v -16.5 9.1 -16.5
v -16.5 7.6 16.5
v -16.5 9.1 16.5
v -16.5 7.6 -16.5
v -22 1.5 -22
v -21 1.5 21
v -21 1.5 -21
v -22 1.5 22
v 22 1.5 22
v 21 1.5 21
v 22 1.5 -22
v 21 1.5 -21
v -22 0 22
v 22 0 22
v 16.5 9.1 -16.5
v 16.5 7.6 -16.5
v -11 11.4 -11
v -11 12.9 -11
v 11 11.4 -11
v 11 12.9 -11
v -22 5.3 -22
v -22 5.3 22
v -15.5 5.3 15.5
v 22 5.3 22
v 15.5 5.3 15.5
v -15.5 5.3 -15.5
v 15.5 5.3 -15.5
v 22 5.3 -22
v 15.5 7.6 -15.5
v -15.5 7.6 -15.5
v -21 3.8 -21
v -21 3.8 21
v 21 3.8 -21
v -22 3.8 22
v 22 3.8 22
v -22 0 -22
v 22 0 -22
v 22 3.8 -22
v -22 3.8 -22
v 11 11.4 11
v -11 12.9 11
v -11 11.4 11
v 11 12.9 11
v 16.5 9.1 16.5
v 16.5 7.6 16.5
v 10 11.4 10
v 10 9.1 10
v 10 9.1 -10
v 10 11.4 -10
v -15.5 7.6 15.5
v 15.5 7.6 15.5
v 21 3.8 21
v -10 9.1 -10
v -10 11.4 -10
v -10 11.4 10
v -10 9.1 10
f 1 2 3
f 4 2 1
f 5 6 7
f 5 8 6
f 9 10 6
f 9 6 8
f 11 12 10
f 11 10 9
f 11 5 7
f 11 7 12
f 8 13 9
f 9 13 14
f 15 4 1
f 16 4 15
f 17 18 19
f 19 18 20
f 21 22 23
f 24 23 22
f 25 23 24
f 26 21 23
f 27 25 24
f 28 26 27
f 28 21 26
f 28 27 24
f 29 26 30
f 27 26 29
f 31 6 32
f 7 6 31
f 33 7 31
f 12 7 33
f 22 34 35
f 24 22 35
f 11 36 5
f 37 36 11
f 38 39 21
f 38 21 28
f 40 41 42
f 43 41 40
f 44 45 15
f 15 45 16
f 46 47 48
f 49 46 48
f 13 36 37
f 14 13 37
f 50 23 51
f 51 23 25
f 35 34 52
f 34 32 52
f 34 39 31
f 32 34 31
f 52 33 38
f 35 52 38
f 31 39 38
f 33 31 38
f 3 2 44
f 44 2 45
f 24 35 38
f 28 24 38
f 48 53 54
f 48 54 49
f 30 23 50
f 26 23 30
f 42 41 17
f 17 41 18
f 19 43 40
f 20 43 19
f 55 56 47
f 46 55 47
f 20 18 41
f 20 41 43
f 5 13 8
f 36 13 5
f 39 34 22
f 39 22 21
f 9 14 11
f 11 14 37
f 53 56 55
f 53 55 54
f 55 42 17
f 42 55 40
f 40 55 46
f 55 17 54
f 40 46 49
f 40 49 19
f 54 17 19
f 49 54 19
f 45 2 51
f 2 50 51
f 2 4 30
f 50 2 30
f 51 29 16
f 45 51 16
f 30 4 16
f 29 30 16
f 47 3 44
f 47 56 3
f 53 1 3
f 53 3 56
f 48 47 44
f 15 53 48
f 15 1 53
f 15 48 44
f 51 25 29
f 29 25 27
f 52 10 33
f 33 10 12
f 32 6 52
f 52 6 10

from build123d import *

# Parameters (mm, degrees)
SKETCH1_W           = 44
SKETCH1_H           = 44
BOSS_EXTRUDE1_DEPTH = 1.5
SKETCH1_3_W         = 42
SKETCH1_3_H         = 42
BOSS_EXTRUDE2_DEPTH = 3.8
BOSS_EXTRUDE3_START = 3.8
SKETCH1_5_W         = 44
SKETCH1_5_H         = 44
BOSS_EXTRUDE3_DEPTH = 1.5
BOSS_EXTRUDE4_START = 5.3
SKETCH1_6_W         = 31
SKETCH1_6_H         = 31
BOSS_EXTRUDE4_DEPTH = 2.3
BOSS_EXTRUDE5_START = 7.6
SKETCH1_7_W         = 33
SKETCH1_7_H         = 33
BOSS_EXTRUDE5_DEPTH = 1.5
BOSS_EXTRUDE6_START = 9.1
SKETCH1_8_W         = 20
SKETCH1_8_H         = 20
BOSS_EXTRUDE6_DEPTH = 2.3
BOSS_EXTRUDE7_START = 12.9
SKETCH1_12_W        = 22
SKETCH1_12_H        = 22
BOSS_EXTRUDE7_DEPTH = 1.5


with BuildPart() as part:
    # Sketch1 → Boss-Extrude1 (new body)
    with BuildSketch(Plane(origin=(0, 0, 0), x_dir=(1, 0, 0), z_dir=(0, 1, 0))):
        Rectangle(SKETCH1_W, SKETCH1_H)
    extrude(amount=BOSS_EXTRUDE1_DEPTH)

    # Sketch1<3> → Boss-Extrude2 (add)
    with BuildSketch(Plane(origin=(0, 0, 0), x_dir=(1, 0, 0), z_dir=(0, 1, 0))):
        Rectangle(SKETCH1_3_W, SKETCH1_3_H)
    extrude(amount=BOSS_EXTRUDE2_DEPTH)

    # Sketch1<5> → Boss-Extrude3 (add)
    with BuildSketch(Plane(origin=(0, 0, 0), x_dir=(1, 0, 0), z_dir=(0, 1, 0)).offset(BOSS_EXTRUDE3_START)):
        Rectangle(SKETCH1_5_W, SKETCH1_5_H)
    extrude(amount=BOSS_EXTRUDE3_DEPTH)

    # Sketch1<6> → Boss-Extrude4 (add)
    with BuildSketch(Plane(origin=(0, 0, 0), x_dir=(1, 0, 0), z_dir=(0, 1, 0)).offset(BOSS_EXTRUDE4_START)):
        Rectangle(SKETCH1_6_W, SKETCH1_6_H)
    extrude(amount=BOSS_EXTRUDE4_DEPTH)

    # Sketch1<7> → Boss-Extrude5 (add)
    with BuildSketch(Plane(origin=(0, 0, 0), x_dir=(1, 0, 0), z_dir=(0, 1, 0)).offset(BOSS_EXTRUDE5_START)):
        Rectangle(SKETCH1_7_W, SKETCH1_7_H)
    extrude(amount=BOSS_EXTRUDE5_DEPTH)

    # Sketch1<8> → Boss-Extrude6 (add)
    with BuildSketch(Plane(origin=(0, 0, 0), x_dir=(1, 0, 0), z_dir=(0, 1, 0)).offset(BOSS_EXTRUDE6_START)):
        Rectangle(SKETCH1_8_W, SKETCH1_8_H)
    extrude(amount=BOSS_EXTRUDE6_DEPTH)

    # Sketch1<12> → Boss-Extrude7 (add)
    with BuildSketch(Plane(origin=(0, 0, 0), x_dir=(1, 0, 0), z_dir=(0, 1, 0)).offset(BOSS_EXTRUDE7_START)):
        Rectangle(SKETCH1_12_W, SKETCH1_12_H)
    extrude(amount=-BOSS_EXTRUDE7_DEPTH)


solid = part.part
